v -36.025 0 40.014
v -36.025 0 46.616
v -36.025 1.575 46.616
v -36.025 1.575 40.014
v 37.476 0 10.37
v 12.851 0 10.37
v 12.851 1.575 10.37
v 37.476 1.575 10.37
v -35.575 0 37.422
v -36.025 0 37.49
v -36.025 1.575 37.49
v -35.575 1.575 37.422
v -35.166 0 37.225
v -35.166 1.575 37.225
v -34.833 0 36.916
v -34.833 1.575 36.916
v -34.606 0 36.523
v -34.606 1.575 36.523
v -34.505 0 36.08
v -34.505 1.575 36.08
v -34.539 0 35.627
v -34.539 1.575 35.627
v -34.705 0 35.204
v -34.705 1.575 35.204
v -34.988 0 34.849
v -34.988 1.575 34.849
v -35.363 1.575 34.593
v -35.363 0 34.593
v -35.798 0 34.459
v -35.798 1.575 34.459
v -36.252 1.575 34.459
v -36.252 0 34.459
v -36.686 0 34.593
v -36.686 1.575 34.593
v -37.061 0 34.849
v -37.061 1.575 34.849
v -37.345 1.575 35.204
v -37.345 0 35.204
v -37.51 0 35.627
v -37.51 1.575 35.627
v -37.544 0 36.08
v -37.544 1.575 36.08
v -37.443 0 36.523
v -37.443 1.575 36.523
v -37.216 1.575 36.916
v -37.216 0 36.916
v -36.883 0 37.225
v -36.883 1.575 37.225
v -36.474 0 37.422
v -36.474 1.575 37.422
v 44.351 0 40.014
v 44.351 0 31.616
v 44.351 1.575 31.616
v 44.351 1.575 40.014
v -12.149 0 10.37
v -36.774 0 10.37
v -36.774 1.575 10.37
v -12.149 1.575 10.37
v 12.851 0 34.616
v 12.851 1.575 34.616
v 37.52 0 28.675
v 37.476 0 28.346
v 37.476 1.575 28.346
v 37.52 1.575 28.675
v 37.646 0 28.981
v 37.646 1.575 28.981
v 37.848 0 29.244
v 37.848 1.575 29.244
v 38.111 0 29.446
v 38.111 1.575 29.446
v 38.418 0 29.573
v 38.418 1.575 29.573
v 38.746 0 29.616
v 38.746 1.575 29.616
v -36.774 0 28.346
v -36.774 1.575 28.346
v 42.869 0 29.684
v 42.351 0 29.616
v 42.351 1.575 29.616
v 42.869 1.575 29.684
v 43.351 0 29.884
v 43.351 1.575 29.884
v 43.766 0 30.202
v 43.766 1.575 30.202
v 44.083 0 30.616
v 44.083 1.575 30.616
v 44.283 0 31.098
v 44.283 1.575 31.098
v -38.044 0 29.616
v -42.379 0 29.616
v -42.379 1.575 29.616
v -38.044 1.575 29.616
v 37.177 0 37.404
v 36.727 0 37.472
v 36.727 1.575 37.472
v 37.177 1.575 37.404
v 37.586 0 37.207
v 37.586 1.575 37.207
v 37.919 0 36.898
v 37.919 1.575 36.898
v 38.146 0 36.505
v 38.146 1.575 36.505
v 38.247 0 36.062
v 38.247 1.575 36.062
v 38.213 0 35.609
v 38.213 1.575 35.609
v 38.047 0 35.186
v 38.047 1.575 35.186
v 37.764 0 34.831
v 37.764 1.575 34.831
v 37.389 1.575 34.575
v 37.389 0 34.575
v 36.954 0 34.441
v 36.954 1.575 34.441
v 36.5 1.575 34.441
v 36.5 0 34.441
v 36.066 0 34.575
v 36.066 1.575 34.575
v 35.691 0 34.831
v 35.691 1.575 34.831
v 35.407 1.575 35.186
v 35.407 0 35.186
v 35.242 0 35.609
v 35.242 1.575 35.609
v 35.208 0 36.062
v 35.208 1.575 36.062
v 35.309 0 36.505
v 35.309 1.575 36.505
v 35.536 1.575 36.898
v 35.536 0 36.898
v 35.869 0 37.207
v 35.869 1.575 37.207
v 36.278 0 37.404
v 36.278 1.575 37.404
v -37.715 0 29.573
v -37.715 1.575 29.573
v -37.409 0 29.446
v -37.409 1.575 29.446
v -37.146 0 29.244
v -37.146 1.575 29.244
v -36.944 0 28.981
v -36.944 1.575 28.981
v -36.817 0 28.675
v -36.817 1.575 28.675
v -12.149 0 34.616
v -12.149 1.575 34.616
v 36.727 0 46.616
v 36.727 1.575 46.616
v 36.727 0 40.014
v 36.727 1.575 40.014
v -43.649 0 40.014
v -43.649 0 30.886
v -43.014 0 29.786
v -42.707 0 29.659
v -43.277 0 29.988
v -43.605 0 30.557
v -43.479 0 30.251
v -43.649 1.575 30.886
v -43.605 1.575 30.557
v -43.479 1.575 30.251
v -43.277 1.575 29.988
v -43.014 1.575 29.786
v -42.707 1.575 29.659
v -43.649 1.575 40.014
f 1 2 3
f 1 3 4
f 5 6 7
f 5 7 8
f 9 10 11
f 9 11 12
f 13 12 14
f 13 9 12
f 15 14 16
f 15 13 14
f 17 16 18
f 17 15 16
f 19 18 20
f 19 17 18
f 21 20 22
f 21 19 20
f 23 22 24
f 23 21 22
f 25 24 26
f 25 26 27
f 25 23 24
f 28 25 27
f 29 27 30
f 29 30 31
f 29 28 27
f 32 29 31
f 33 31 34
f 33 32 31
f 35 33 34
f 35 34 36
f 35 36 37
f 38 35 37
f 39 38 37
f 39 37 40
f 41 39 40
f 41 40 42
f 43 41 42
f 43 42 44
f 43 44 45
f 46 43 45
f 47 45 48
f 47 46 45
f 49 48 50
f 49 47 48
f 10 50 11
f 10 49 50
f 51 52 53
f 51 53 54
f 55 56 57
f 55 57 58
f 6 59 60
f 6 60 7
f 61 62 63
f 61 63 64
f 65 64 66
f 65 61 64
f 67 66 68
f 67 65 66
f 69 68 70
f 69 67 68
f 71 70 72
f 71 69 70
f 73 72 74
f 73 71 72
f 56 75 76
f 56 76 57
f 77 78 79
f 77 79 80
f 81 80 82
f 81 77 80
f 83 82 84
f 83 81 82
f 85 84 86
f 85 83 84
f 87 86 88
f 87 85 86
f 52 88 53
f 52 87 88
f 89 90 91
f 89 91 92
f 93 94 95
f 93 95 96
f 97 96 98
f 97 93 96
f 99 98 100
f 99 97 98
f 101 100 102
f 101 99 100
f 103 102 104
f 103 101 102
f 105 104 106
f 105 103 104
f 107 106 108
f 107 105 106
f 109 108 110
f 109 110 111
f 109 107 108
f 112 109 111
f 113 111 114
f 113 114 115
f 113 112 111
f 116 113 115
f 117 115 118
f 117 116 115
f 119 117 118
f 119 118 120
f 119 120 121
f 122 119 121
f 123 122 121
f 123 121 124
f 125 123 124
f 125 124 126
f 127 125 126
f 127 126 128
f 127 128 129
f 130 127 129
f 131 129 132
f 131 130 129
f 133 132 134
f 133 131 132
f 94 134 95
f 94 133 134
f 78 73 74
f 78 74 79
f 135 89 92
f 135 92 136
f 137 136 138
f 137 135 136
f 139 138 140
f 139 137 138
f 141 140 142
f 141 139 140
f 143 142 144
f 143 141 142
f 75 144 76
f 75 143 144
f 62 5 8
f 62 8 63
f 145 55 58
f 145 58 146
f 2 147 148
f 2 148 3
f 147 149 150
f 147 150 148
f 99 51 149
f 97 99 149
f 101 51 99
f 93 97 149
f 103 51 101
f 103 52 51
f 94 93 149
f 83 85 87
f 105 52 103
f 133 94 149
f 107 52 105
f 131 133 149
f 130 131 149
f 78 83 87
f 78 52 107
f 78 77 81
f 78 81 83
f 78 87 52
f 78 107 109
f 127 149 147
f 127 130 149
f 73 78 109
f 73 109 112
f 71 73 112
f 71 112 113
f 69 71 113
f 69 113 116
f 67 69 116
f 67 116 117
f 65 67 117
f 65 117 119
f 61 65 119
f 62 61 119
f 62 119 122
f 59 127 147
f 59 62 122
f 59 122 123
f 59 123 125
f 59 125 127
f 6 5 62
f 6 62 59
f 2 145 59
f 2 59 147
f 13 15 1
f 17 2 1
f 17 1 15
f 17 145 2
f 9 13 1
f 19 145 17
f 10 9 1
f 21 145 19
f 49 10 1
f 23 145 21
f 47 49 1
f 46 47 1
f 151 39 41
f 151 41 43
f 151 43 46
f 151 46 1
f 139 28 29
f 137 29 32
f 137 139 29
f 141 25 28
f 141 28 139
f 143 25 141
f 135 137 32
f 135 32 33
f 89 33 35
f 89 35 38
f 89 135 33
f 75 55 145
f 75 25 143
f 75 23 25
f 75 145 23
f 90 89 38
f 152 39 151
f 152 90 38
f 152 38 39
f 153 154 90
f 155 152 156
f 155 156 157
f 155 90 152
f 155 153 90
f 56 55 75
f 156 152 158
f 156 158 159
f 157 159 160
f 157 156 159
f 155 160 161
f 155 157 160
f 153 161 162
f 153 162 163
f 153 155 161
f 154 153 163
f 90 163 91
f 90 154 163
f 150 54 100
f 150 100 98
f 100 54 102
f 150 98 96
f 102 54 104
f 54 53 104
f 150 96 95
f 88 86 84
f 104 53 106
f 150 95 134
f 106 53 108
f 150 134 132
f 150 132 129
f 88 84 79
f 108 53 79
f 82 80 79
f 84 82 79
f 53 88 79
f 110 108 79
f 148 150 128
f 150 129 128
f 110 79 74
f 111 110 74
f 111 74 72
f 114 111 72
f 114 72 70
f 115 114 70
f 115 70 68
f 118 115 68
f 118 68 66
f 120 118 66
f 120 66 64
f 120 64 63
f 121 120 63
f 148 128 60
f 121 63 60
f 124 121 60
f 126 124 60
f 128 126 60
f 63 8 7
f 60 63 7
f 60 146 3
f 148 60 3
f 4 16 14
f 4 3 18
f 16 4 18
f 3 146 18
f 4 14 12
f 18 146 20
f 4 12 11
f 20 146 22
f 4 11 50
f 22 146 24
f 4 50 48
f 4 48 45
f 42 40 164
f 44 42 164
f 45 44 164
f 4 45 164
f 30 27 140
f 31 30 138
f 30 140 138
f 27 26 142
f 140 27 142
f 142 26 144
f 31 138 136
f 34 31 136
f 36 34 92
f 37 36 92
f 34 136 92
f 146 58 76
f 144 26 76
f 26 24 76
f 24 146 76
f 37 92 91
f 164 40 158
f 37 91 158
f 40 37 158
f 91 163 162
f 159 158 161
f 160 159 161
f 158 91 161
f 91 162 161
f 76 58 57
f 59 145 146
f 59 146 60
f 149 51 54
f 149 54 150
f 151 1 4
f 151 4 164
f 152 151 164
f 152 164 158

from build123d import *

# Parameters (mm, degrees)
SKETCH1_R           = 1.524000008
SKETCH1_R_2         = 1.523999992
BOSS_EXTRUDE1_DEPTH = 1.575


with BuildPart() as part:
    # Sketch1 → Boss-Extrude1 (new body)
    with BuildSketch(Plane(origin=(0, 0, 0), x_dir=(1, 0, 0), z_dir=(0, 1, 0))):
        with BuildLine():
            Line((44.351293307, -40.014412246), (36.727293315, -40.014412246))
            Line((36.727293315, -40.014412246), (36.727293315, -46.615946892))
            Line((36.727293315, -46.615946892), (30.377293307, -46.615946892))
            Line((30.377293307, -46.615946892), (-29.674706693, -46.615946892))
            Line((-29.674706693, -46.615946892), (-36.024706701, -46.615946892))
            Line((-36.024706701, -46.615946892), (-36.024706701, -40.014412246))
            Line((-36.024706701, -40.014412246), (-43.648706693, -40.014412246))
            Line((-43.648706693, -40.014412246), (-43.648706693, -30.885946892))
            ThreePointArc((-43.648706693, -30.885946892), (-43.276732305, -29.98792128), (-42.378706693, -29.615946892))
            Line((-42.378706693, -29.615946892), (-38.043706693, -29.615946892))
            ThreePointArc((-38.043706693, -29.615946892), (-37.145681081, -29.243972504), (-36.773706693, -28.345946892))
            Line((-36.773706693, -28.345946892), (-36.773706693, -10.370428445))
            Line((-36.773706693, -10.370428445), (-12.148706693, -10.370428445))
            Line((-12.148706693, -10.370428445), (-12.148706693, -17.871301308))
            Line((-12.148706693, -17.871301308), (-12.148706693, -34.615947016))
            Line((-12.148706693, -34.615947016), (12.851293307, -34.615947016))
            Line((12.851293307, -34.615947016), (12.851293307, -17.871301308))
            Line((12.851293307, -17.871301308), (12.851293307, -10.370428445))
            Line((12.851293307, -10.370428445), (37.476293307, -10.370428445))
            Line((37.476293307, -10.370428445), (37.476293307, -28.345946892))
            ThreePointArc((37.476293307, -28.345946892), (37.848267695, -29.243972504), (38.746293307, -29.615946892))
            Line((38.746293307, -29.615946892), (42.351293307, -29.615946892))
            ThreePointArc((42.351293307, -29.615946892), (43.76550687, -30.20173333), (44.351293307, -31.615946892))
            Line((44.351293307, -31.615946892), (44.351293307, -40.014412246))
        make_face()
        with Locations(Location((-36.024706701, -35.965946892, 0), (0, 0, 270))):
            Circle(SKETCH1_R, mode=Mode.SUBTRACT)
        with Locations(Location((36.727293315, -35.947946892, 0), (0, 0, 270))):
            Circle(SKETCH1_R_2, mode=Mode.SUBTRACT)
    extrude(amount=BOSS_EXTRUDE1_DEPTH)


solid = part.part
